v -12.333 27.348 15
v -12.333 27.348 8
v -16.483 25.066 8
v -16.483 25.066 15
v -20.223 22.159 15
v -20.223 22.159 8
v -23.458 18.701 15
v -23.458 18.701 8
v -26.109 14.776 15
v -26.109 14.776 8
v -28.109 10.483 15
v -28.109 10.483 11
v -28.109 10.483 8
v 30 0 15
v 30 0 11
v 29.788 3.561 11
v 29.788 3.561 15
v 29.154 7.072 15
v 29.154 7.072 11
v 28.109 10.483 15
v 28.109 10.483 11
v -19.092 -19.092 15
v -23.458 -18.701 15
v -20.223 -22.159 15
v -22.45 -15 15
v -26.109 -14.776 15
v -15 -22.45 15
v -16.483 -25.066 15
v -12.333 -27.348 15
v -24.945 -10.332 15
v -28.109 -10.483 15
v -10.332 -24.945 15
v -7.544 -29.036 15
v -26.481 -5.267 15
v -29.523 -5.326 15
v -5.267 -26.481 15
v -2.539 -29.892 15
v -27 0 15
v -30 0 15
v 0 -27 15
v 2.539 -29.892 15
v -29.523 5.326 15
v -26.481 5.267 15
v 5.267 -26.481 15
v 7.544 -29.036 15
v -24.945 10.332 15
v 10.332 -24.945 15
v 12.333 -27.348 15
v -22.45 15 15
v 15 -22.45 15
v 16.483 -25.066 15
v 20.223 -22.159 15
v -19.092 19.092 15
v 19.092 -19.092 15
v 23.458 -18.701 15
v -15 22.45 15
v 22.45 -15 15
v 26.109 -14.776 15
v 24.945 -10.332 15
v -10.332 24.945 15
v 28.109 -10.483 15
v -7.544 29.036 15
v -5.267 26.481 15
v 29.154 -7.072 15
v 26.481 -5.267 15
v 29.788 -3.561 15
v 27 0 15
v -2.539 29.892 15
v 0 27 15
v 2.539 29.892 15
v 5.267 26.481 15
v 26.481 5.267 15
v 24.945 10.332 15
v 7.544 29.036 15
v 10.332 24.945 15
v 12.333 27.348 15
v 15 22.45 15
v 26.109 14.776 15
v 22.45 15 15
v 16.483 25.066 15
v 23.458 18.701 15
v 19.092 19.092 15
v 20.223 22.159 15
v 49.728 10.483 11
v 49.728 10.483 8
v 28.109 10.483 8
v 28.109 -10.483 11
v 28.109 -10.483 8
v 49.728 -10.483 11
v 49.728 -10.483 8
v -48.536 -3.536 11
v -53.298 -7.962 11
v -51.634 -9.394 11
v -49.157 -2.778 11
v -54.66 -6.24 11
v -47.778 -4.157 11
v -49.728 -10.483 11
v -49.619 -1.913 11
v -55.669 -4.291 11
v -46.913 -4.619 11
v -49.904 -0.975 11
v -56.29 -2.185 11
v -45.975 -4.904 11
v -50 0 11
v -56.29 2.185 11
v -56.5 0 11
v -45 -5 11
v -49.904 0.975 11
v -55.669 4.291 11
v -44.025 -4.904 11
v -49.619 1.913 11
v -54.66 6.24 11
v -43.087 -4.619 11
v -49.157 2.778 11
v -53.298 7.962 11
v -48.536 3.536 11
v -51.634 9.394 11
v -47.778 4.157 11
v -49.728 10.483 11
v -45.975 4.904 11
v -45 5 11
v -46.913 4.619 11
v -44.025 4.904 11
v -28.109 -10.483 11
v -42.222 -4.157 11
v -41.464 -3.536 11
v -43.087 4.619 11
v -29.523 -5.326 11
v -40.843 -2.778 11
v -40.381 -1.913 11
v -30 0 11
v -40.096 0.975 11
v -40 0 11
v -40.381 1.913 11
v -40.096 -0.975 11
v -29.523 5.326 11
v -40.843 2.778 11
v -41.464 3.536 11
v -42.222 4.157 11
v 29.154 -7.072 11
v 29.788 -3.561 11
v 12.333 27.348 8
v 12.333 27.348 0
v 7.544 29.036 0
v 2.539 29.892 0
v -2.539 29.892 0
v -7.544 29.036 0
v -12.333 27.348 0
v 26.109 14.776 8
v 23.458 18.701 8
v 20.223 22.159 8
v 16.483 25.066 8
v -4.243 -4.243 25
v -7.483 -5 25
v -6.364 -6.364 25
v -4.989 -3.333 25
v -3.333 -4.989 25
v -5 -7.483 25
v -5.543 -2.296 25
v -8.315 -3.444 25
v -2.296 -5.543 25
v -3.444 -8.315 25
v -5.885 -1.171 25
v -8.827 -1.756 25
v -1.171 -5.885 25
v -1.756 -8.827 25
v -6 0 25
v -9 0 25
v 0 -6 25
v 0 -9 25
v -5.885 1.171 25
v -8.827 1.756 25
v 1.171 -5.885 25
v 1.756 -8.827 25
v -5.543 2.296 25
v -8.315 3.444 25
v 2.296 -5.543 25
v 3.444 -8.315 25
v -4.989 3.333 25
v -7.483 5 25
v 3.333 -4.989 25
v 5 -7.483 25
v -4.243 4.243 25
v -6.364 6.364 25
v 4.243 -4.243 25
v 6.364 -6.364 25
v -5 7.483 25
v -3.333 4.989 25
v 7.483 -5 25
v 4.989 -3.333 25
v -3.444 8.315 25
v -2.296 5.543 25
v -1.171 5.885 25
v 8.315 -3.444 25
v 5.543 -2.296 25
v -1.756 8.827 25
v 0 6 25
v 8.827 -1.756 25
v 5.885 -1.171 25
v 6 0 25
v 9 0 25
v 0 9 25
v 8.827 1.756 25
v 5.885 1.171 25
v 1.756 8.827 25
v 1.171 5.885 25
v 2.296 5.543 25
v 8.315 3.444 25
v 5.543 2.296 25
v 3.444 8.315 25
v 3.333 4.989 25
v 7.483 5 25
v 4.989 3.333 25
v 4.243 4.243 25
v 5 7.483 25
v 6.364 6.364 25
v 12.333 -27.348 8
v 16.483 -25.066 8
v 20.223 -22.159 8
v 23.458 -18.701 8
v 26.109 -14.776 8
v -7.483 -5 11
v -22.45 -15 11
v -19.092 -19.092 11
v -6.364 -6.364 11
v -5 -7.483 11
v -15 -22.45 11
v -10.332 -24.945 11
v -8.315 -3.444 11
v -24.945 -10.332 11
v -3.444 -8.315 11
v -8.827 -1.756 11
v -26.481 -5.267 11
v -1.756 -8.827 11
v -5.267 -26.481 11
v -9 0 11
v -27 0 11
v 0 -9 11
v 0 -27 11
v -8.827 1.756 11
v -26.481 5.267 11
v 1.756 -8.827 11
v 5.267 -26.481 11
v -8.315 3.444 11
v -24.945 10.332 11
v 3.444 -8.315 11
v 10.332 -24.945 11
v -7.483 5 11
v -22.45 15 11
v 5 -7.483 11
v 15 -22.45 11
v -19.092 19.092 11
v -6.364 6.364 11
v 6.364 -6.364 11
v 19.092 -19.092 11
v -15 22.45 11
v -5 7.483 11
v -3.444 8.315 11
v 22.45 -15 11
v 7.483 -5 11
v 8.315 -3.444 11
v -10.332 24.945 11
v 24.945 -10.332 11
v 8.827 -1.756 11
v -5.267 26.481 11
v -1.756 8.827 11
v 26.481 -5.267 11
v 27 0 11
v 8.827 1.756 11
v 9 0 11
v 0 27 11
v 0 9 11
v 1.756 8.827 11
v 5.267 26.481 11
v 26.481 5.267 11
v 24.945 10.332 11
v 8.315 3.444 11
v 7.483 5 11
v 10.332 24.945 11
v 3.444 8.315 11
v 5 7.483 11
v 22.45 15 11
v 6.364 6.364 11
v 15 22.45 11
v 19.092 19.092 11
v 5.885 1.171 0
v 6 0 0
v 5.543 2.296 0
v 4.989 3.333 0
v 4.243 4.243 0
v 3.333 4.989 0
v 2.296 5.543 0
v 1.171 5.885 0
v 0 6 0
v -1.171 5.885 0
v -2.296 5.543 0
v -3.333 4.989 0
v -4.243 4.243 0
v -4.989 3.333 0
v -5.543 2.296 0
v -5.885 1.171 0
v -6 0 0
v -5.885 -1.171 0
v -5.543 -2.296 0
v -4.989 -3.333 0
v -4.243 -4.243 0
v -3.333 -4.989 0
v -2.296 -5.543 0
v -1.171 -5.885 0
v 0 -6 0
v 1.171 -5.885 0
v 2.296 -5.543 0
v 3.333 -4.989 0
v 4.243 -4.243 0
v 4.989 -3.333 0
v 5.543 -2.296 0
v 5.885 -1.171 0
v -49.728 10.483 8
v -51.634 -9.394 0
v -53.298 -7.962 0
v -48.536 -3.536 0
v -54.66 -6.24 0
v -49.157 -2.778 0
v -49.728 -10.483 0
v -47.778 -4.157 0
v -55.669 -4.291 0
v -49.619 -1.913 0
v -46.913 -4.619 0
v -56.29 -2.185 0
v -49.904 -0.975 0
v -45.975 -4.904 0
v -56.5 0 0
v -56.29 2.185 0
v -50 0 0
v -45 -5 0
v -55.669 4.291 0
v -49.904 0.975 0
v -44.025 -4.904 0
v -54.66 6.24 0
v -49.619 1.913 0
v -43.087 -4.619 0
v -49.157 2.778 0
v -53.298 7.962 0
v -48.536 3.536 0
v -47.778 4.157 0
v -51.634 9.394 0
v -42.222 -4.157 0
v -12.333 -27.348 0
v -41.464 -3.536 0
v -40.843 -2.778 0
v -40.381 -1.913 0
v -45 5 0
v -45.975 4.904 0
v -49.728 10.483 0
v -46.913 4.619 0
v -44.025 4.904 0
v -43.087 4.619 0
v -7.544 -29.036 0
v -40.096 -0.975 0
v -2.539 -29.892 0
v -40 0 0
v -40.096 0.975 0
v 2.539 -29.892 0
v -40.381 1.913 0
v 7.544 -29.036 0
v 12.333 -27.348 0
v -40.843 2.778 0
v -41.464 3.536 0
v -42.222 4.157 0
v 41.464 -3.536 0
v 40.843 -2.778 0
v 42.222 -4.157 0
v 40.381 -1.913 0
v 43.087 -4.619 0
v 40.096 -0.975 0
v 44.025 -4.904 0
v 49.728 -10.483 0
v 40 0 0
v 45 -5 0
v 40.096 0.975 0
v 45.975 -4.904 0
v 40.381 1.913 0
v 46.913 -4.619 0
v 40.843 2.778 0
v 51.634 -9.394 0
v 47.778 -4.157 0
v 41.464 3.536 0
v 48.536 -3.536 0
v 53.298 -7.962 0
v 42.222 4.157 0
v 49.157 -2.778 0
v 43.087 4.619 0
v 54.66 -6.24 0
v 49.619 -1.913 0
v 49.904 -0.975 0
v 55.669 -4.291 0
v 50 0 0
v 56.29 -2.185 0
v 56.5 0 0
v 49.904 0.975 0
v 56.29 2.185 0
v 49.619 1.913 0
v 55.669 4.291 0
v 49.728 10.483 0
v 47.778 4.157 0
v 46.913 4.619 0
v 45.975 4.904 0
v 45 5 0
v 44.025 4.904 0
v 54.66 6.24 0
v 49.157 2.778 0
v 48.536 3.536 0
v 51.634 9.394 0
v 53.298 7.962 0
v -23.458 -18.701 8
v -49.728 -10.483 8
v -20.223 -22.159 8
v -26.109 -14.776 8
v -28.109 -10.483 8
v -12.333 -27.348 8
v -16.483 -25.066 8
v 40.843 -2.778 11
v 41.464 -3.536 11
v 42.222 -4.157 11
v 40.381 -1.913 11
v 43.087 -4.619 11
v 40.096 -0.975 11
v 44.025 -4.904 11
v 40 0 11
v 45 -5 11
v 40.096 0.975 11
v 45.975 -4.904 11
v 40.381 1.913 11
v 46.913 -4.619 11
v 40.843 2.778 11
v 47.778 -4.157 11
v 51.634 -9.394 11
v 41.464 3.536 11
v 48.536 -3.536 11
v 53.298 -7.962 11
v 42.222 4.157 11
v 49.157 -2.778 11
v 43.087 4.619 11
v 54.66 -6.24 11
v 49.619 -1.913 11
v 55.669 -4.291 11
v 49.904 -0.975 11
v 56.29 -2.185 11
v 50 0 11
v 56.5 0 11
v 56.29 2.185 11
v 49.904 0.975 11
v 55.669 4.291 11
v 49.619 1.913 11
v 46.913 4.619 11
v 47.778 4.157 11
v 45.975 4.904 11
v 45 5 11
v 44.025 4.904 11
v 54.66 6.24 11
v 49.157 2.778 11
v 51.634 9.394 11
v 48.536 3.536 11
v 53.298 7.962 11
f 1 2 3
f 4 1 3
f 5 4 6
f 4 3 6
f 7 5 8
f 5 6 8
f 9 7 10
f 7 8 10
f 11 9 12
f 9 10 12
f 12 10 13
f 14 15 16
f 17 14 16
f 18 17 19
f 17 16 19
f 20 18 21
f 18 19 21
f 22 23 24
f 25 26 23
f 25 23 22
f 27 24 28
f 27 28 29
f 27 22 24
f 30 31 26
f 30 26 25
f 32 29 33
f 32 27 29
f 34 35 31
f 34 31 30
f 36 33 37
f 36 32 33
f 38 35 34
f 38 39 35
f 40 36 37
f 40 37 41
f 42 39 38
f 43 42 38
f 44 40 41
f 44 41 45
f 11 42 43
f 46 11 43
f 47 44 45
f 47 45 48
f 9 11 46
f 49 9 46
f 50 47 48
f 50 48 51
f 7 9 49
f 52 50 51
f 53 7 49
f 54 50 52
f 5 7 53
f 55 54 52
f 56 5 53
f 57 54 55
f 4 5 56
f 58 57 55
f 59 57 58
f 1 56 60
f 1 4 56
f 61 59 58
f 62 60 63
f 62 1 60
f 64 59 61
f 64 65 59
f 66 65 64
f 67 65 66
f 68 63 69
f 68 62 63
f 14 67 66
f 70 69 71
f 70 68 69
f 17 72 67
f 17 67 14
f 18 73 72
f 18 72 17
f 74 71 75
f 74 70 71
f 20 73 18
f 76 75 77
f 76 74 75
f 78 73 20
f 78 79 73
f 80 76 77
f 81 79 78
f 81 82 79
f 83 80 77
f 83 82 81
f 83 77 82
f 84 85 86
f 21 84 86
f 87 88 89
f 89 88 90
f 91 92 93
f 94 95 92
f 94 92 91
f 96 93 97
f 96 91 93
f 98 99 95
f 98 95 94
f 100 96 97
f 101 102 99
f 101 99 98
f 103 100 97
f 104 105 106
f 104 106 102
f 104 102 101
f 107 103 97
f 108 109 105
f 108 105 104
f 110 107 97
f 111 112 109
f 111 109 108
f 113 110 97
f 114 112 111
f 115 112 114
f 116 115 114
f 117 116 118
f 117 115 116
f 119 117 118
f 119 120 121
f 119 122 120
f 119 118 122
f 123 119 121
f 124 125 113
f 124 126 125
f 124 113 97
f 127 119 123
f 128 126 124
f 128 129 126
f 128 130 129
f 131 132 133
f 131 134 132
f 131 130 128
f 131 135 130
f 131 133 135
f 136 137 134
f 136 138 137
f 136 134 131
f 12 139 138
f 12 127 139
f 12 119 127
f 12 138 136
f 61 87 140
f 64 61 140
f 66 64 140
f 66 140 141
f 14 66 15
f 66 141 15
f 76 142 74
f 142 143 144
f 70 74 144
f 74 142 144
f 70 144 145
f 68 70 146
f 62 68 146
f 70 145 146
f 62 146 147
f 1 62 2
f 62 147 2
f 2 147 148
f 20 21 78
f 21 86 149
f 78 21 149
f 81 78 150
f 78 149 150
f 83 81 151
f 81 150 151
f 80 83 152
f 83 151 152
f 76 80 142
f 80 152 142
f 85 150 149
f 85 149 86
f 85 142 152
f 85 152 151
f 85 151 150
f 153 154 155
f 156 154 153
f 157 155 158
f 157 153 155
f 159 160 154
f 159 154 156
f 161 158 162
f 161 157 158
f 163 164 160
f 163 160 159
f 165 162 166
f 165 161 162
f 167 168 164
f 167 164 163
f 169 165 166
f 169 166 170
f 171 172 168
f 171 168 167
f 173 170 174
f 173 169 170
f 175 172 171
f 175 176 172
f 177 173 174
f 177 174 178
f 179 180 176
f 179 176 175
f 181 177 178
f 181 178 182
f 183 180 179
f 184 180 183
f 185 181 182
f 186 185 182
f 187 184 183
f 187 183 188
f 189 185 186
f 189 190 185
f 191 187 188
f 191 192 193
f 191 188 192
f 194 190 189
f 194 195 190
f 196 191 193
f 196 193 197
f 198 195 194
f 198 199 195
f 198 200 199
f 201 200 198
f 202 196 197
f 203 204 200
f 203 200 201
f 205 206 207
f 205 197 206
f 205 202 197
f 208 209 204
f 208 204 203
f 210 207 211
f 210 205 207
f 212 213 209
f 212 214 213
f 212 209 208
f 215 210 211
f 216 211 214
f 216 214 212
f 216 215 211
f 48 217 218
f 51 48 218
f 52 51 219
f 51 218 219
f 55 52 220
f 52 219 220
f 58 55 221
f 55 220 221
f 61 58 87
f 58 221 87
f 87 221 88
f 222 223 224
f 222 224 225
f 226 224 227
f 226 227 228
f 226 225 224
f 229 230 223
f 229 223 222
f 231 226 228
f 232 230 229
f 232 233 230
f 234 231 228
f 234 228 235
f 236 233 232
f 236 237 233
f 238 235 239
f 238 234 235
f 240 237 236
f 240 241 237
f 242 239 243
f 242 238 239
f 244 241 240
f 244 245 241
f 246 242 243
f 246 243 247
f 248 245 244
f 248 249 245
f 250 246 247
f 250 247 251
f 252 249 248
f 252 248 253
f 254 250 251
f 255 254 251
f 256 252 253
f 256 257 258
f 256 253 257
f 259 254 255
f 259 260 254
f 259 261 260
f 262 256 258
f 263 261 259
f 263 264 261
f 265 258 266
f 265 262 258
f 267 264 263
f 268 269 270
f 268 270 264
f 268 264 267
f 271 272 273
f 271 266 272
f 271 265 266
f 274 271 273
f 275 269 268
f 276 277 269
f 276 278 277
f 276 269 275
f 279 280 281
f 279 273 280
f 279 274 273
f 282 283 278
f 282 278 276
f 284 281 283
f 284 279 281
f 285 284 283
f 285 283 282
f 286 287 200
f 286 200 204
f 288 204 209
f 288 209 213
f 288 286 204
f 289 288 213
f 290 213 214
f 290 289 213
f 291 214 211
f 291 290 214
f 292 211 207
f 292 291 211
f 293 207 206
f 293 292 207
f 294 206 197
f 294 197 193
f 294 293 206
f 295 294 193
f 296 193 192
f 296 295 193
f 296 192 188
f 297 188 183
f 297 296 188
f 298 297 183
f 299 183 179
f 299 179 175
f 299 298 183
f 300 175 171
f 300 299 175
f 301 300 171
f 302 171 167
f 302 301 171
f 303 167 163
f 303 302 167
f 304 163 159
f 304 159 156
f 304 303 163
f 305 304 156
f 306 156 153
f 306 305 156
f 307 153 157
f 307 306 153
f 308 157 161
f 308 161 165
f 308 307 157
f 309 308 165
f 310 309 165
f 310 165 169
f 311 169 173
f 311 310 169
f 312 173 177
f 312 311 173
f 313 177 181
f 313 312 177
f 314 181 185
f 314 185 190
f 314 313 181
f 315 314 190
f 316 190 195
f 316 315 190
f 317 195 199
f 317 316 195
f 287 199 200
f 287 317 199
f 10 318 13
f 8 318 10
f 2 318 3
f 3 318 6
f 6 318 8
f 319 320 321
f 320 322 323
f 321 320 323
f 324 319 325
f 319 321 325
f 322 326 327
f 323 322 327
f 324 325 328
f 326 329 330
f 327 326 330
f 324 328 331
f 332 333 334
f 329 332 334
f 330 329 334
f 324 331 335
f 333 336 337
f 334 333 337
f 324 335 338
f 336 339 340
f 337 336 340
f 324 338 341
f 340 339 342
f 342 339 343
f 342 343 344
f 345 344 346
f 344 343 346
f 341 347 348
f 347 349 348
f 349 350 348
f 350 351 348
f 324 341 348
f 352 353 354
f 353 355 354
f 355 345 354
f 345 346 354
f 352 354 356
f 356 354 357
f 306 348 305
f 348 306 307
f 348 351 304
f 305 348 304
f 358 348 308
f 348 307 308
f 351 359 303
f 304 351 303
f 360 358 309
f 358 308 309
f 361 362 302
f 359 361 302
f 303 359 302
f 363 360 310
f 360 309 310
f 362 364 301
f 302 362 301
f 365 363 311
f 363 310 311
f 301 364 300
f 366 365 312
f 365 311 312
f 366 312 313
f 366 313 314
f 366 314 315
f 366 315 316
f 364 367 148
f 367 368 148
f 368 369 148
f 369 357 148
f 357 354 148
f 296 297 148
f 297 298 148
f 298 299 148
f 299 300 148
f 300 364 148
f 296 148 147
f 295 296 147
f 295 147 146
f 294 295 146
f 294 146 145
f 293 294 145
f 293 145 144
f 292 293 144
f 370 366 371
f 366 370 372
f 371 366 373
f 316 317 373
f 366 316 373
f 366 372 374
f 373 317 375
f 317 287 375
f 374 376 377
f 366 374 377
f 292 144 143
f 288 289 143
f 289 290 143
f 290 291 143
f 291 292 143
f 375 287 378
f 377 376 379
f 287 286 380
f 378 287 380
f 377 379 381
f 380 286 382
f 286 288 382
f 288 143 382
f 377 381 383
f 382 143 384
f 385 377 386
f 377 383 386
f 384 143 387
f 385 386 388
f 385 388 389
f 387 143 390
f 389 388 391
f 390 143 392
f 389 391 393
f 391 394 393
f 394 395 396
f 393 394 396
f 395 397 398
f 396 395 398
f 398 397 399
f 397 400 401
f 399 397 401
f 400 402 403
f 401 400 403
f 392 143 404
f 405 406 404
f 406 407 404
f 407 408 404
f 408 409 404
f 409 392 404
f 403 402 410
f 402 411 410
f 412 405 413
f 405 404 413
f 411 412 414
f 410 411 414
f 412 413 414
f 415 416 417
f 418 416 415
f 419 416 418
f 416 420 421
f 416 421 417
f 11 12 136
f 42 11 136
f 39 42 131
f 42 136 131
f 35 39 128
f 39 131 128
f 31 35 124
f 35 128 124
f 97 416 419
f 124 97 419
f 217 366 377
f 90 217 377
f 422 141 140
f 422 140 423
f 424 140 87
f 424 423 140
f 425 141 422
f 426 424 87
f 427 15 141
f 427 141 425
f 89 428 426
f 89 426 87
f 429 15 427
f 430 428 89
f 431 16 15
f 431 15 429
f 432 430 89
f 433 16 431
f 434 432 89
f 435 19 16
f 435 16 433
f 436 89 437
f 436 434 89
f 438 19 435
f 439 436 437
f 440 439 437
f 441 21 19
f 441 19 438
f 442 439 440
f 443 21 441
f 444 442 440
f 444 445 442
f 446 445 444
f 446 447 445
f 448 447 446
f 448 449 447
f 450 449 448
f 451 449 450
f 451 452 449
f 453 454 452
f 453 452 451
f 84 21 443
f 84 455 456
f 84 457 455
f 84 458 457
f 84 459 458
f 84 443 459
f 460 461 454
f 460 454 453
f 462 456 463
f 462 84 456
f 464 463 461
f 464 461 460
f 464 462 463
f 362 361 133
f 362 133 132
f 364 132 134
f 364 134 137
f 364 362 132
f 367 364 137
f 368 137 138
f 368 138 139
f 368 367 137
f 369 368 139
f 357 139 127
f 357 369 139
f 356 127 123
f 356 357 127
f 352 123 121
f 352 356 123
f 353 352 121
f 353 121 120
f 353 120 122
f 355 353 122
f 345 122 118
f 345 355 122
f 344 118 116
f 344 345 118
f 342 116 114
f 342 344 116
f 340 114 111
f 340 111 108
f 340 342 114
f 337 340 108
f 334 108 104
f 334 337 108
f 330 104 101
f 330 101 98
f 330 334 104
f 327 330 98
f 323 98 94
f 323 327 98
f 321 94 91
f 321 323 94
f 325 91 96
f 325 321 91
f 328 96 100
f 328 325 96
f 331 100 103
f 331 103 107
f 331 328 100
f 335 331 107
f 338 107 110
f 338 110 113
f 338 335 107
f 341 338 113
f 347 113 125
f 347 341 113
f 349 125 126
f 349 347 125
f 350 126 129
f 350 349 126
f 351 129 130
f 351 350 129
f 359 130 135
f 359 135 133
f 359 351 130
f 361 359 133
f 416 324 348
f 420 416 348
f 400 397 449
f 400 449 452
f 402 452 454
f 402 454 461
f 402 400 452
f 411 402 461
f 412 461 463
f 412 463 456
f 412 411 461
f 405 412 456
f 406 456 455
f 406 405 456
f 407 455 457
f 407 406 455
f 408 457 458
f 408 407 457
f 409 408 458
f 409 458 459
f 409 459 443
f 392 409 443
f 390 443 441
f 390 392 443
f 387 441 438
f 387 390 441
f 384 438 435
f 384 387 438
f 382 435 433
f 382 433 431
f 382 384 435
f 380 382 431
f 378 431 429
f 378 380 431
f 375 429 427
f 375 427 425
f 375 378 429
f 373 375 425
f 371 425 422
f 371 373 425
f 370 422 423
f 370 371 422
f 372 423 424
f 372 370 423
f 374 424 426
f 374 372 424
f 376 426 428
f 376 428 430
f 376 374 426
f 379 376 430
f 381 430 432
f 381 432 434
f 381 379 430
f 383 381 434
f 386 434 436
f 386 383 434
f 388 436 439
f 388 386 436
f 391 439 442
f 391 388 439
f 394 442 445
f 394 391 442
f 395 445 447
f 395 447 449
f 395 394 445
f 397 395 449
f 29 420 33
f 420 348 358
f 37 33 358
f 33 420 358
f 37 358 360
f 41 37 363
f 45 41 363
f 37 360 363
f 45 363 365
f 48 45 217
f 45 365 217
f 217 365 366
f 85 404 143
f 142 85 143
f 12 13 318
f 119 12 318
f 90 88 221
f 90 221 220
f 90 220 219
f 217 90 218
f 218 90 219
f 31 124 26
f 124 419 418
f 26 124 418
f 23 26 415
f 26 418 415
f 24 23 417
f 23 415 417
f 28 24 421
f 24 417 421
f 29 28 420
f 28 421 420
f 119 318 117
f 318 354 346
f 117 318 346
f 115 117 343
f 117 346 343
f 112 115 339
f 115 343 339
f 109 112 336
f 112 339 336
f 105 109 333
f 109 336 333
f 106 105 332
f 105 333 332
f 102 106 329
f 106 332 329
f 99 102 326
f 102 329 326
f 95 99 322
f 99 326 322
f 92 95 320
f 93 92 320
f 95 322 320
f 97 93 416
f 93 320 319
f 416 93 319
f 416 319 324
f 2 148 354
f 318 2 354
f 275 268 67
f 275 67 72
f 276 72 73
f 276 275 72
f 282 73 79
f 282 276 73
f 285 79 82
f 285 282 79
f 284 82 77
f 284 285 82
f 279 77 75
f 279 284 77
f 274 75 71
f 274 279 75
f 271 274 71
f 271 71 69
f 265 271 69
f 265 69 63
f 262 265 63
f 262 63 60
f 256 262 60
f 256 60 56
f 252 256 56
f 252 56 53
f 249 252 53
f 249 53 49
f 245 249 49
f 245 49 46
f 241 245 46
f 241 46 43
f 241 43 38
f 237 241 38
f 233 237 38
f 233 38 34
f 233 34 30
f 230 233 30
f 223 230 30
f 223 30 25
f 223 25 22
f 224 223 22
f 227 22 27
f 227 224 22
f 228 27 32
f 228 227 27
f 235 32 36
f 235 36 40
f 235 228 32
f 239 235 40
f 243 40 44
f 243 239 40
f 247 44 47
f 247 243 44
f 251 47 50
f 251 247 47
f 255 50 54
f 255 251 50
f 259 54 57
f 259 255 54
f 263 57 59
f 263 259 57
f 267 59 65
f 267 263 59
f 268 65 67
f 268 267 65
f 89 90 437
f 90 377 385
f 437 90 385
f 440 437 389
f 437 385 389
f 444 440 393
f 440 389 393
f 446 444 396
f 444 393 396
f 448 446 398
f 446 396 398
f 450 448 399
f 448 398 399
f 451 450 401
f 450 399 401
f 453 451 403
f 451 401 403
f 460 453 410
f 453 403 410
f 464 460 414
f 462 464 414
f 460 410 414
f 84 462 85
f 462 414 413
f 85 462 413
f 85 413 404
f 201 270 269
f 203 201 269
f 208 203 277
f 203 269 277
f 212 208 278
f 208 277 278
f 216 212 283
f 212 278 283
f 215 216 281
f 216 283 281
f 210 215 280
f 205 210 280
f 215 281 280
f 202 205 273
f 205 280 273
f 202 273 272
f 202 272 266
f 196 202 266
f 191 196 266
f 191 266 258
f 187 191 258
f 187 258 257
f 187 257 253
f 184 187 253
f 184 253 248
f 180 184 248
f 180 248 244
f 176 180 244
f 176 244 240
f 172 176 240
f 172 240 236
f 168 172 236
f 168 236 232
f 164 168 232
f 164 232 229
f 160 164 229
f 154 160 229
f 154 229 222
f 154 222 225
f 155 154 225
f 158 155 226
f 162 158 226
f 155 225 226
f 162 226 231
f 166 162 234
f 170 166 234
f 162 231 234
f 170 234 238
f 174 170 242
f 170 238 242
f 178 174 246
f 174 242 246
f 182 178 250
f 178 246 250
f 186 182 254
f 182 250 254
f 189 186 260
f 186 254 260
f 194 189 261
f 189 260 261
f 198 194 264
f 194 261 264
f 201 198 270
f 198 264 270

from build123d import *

# Parameters (mm, degrees)
F0_R     = 5
F1_DEPTH = 11
F0_R_2   = 27
F2_DEPTH = 15
F0_R_3   = 9
F3_DEPTH = 11
F0_R_4   = 6
F4_DEPTH = 25
F5_DEPTH = 8


with BuildPart() as f1:
    # F0 (on Top) → F1 (new body)
    with BuildSketch(Plane.XY):
        with BuildLine():
            ThreePointArc((-28.108751, -10.48323), (-30, 0), (-28.108751, 10.48323))
            Line((-28.108751, 10.48323), (-49.727778, 10.48323))
            ThreePointArc((-49.727778, 10.48323), (-56.5, 0), (-49.727778, -10.48323))
            Line((-49.727778, -10.48323), (-28.108751, -10.48323))
        make_face()
        with Locations((-45, 0)):
            Circle(F0_R, mode=Mode.SUBTRACT)
        with BuildLine():
            ThreePointArc((28.108751, 10.48323), (29.523402, 5.326231), (30, 0))
            ThreePointArc((30, 0), (29.523402, -5.326231), (28.108751, -10.48323))
            Line((28.108751, -10.48323), (49.727778, -10.48323))
            ThreePointArc((49.727778, -10.48323), (56.5, 0), (49.727778, 10.48323))
            Line((49.727778, 10.48323), (28.108751, 10.48323))
        make_face()
        with Locations((45, 0)):
            Circle(F0_R, mode=Mode.SUBTRACT)
    extrude(amount=F1_DEPTH)

    # F0 (on Top) → F2 (join)
    with BuildSketch(Plane.XY):
        with BuildLine():
            ThreePointArc((28.108751, -10.48323), (29.523402, -5.326231), (30, 0))
            ThreePointArc((30, 0), (29.523402, 5.326231), (28.108751, 10.48323))
            ThreePointArc((28.108751, 10.48323), (21.908718, 20.494098), (12.333333, 27.347557))
            ThreePointArc((12.333333, 27.347557), (0, 30), (-12.333333, 27.347557))
            ThreePointArc((-12.333333, 27.347557), (-21.908718, 20.494098), (-28.108751, 10.48323))
            ThreePointArc((-28.108751, 10.48323), (-30, 0), (-28.108751, -10.48323))
            ThreePointArc((-28.108751, -10.48323), (-21.908718, -20.494098), (-12.333333, -27.347557))
            ThreePointArc((-12.333333, -27.347557), (0, -30), (12.333333, -27.347557))
            ThreePointArc((12.333333, -27.347557), (21.908718, -20.494098), (28.108751, -10.48323))
        make_face()
        Circle(F0_R_2, mode=Mode.SUBTRACT)
    extrude(amount=F2_DEPTH)

    # F0 (on Top) → F3 (join)
    with BuildSketch(Plane.XY):
        Circle(F0_R_2)
        Circle(F0_R_3, mode=Mode.SUBTRACT)
    extrude(amount=F3_DEPTH)

    # F0 (on Top) → F4 (join)
    with BuildSketch(Plane.XY):
        Circle(F0_R_3)
        Circle(F0_R_4, mode=Mode.SUBTRACT)
    extrude(amount=F4_DEPTH)

    # F0 (on Top) → F5 (join)
    with BuildSketch(Plane.XY):
        with BuildLine():
            Line((-49.727778, -10.48323), (-12.333333, -27.347557))
            ThreePointArc((-12.333333, -27.347557), (-21.908718, -20.494098), (-28.108751, -10.48323))
            Line((-28.108751, -10.48323), (-49.727778, -10.48323))
        make_face()
        with BuildLine():
            Line((49.727778, -10.48323), (28.108751, -10.48323))
            ThreePointArc((28.108751, -10.48323), (21.908718, -20.494098), (12.333333, -27.347557))
            Line((12.333333, -27.347557), (49.727778, -10.48323))
        make_face()
        with BuildLine():
            ThreePointArc((-28.108751, 10.48323), (-21.908718, 20.494098), (-12.333333, 27.347557))
            Line((-12.333333, 27.347557), (-49.727778, 10.48323))
            Line((-49.727778, 10.48323), (-28.108751, 10.48323))
        make_face()
        with BuildLine():
            ThreePointArc((12.333333, 27.347557), (21.908718, 20.494098), (28.108751, 10.48323))
            Line((28.108751, 10.48323), (49.727778, 10.48323))
            Line((49.727778, 10.48323), (12.333333, 27.347557))
        make_face()
    extrude(amount=F5_DEPTH)


solid = f1.part
